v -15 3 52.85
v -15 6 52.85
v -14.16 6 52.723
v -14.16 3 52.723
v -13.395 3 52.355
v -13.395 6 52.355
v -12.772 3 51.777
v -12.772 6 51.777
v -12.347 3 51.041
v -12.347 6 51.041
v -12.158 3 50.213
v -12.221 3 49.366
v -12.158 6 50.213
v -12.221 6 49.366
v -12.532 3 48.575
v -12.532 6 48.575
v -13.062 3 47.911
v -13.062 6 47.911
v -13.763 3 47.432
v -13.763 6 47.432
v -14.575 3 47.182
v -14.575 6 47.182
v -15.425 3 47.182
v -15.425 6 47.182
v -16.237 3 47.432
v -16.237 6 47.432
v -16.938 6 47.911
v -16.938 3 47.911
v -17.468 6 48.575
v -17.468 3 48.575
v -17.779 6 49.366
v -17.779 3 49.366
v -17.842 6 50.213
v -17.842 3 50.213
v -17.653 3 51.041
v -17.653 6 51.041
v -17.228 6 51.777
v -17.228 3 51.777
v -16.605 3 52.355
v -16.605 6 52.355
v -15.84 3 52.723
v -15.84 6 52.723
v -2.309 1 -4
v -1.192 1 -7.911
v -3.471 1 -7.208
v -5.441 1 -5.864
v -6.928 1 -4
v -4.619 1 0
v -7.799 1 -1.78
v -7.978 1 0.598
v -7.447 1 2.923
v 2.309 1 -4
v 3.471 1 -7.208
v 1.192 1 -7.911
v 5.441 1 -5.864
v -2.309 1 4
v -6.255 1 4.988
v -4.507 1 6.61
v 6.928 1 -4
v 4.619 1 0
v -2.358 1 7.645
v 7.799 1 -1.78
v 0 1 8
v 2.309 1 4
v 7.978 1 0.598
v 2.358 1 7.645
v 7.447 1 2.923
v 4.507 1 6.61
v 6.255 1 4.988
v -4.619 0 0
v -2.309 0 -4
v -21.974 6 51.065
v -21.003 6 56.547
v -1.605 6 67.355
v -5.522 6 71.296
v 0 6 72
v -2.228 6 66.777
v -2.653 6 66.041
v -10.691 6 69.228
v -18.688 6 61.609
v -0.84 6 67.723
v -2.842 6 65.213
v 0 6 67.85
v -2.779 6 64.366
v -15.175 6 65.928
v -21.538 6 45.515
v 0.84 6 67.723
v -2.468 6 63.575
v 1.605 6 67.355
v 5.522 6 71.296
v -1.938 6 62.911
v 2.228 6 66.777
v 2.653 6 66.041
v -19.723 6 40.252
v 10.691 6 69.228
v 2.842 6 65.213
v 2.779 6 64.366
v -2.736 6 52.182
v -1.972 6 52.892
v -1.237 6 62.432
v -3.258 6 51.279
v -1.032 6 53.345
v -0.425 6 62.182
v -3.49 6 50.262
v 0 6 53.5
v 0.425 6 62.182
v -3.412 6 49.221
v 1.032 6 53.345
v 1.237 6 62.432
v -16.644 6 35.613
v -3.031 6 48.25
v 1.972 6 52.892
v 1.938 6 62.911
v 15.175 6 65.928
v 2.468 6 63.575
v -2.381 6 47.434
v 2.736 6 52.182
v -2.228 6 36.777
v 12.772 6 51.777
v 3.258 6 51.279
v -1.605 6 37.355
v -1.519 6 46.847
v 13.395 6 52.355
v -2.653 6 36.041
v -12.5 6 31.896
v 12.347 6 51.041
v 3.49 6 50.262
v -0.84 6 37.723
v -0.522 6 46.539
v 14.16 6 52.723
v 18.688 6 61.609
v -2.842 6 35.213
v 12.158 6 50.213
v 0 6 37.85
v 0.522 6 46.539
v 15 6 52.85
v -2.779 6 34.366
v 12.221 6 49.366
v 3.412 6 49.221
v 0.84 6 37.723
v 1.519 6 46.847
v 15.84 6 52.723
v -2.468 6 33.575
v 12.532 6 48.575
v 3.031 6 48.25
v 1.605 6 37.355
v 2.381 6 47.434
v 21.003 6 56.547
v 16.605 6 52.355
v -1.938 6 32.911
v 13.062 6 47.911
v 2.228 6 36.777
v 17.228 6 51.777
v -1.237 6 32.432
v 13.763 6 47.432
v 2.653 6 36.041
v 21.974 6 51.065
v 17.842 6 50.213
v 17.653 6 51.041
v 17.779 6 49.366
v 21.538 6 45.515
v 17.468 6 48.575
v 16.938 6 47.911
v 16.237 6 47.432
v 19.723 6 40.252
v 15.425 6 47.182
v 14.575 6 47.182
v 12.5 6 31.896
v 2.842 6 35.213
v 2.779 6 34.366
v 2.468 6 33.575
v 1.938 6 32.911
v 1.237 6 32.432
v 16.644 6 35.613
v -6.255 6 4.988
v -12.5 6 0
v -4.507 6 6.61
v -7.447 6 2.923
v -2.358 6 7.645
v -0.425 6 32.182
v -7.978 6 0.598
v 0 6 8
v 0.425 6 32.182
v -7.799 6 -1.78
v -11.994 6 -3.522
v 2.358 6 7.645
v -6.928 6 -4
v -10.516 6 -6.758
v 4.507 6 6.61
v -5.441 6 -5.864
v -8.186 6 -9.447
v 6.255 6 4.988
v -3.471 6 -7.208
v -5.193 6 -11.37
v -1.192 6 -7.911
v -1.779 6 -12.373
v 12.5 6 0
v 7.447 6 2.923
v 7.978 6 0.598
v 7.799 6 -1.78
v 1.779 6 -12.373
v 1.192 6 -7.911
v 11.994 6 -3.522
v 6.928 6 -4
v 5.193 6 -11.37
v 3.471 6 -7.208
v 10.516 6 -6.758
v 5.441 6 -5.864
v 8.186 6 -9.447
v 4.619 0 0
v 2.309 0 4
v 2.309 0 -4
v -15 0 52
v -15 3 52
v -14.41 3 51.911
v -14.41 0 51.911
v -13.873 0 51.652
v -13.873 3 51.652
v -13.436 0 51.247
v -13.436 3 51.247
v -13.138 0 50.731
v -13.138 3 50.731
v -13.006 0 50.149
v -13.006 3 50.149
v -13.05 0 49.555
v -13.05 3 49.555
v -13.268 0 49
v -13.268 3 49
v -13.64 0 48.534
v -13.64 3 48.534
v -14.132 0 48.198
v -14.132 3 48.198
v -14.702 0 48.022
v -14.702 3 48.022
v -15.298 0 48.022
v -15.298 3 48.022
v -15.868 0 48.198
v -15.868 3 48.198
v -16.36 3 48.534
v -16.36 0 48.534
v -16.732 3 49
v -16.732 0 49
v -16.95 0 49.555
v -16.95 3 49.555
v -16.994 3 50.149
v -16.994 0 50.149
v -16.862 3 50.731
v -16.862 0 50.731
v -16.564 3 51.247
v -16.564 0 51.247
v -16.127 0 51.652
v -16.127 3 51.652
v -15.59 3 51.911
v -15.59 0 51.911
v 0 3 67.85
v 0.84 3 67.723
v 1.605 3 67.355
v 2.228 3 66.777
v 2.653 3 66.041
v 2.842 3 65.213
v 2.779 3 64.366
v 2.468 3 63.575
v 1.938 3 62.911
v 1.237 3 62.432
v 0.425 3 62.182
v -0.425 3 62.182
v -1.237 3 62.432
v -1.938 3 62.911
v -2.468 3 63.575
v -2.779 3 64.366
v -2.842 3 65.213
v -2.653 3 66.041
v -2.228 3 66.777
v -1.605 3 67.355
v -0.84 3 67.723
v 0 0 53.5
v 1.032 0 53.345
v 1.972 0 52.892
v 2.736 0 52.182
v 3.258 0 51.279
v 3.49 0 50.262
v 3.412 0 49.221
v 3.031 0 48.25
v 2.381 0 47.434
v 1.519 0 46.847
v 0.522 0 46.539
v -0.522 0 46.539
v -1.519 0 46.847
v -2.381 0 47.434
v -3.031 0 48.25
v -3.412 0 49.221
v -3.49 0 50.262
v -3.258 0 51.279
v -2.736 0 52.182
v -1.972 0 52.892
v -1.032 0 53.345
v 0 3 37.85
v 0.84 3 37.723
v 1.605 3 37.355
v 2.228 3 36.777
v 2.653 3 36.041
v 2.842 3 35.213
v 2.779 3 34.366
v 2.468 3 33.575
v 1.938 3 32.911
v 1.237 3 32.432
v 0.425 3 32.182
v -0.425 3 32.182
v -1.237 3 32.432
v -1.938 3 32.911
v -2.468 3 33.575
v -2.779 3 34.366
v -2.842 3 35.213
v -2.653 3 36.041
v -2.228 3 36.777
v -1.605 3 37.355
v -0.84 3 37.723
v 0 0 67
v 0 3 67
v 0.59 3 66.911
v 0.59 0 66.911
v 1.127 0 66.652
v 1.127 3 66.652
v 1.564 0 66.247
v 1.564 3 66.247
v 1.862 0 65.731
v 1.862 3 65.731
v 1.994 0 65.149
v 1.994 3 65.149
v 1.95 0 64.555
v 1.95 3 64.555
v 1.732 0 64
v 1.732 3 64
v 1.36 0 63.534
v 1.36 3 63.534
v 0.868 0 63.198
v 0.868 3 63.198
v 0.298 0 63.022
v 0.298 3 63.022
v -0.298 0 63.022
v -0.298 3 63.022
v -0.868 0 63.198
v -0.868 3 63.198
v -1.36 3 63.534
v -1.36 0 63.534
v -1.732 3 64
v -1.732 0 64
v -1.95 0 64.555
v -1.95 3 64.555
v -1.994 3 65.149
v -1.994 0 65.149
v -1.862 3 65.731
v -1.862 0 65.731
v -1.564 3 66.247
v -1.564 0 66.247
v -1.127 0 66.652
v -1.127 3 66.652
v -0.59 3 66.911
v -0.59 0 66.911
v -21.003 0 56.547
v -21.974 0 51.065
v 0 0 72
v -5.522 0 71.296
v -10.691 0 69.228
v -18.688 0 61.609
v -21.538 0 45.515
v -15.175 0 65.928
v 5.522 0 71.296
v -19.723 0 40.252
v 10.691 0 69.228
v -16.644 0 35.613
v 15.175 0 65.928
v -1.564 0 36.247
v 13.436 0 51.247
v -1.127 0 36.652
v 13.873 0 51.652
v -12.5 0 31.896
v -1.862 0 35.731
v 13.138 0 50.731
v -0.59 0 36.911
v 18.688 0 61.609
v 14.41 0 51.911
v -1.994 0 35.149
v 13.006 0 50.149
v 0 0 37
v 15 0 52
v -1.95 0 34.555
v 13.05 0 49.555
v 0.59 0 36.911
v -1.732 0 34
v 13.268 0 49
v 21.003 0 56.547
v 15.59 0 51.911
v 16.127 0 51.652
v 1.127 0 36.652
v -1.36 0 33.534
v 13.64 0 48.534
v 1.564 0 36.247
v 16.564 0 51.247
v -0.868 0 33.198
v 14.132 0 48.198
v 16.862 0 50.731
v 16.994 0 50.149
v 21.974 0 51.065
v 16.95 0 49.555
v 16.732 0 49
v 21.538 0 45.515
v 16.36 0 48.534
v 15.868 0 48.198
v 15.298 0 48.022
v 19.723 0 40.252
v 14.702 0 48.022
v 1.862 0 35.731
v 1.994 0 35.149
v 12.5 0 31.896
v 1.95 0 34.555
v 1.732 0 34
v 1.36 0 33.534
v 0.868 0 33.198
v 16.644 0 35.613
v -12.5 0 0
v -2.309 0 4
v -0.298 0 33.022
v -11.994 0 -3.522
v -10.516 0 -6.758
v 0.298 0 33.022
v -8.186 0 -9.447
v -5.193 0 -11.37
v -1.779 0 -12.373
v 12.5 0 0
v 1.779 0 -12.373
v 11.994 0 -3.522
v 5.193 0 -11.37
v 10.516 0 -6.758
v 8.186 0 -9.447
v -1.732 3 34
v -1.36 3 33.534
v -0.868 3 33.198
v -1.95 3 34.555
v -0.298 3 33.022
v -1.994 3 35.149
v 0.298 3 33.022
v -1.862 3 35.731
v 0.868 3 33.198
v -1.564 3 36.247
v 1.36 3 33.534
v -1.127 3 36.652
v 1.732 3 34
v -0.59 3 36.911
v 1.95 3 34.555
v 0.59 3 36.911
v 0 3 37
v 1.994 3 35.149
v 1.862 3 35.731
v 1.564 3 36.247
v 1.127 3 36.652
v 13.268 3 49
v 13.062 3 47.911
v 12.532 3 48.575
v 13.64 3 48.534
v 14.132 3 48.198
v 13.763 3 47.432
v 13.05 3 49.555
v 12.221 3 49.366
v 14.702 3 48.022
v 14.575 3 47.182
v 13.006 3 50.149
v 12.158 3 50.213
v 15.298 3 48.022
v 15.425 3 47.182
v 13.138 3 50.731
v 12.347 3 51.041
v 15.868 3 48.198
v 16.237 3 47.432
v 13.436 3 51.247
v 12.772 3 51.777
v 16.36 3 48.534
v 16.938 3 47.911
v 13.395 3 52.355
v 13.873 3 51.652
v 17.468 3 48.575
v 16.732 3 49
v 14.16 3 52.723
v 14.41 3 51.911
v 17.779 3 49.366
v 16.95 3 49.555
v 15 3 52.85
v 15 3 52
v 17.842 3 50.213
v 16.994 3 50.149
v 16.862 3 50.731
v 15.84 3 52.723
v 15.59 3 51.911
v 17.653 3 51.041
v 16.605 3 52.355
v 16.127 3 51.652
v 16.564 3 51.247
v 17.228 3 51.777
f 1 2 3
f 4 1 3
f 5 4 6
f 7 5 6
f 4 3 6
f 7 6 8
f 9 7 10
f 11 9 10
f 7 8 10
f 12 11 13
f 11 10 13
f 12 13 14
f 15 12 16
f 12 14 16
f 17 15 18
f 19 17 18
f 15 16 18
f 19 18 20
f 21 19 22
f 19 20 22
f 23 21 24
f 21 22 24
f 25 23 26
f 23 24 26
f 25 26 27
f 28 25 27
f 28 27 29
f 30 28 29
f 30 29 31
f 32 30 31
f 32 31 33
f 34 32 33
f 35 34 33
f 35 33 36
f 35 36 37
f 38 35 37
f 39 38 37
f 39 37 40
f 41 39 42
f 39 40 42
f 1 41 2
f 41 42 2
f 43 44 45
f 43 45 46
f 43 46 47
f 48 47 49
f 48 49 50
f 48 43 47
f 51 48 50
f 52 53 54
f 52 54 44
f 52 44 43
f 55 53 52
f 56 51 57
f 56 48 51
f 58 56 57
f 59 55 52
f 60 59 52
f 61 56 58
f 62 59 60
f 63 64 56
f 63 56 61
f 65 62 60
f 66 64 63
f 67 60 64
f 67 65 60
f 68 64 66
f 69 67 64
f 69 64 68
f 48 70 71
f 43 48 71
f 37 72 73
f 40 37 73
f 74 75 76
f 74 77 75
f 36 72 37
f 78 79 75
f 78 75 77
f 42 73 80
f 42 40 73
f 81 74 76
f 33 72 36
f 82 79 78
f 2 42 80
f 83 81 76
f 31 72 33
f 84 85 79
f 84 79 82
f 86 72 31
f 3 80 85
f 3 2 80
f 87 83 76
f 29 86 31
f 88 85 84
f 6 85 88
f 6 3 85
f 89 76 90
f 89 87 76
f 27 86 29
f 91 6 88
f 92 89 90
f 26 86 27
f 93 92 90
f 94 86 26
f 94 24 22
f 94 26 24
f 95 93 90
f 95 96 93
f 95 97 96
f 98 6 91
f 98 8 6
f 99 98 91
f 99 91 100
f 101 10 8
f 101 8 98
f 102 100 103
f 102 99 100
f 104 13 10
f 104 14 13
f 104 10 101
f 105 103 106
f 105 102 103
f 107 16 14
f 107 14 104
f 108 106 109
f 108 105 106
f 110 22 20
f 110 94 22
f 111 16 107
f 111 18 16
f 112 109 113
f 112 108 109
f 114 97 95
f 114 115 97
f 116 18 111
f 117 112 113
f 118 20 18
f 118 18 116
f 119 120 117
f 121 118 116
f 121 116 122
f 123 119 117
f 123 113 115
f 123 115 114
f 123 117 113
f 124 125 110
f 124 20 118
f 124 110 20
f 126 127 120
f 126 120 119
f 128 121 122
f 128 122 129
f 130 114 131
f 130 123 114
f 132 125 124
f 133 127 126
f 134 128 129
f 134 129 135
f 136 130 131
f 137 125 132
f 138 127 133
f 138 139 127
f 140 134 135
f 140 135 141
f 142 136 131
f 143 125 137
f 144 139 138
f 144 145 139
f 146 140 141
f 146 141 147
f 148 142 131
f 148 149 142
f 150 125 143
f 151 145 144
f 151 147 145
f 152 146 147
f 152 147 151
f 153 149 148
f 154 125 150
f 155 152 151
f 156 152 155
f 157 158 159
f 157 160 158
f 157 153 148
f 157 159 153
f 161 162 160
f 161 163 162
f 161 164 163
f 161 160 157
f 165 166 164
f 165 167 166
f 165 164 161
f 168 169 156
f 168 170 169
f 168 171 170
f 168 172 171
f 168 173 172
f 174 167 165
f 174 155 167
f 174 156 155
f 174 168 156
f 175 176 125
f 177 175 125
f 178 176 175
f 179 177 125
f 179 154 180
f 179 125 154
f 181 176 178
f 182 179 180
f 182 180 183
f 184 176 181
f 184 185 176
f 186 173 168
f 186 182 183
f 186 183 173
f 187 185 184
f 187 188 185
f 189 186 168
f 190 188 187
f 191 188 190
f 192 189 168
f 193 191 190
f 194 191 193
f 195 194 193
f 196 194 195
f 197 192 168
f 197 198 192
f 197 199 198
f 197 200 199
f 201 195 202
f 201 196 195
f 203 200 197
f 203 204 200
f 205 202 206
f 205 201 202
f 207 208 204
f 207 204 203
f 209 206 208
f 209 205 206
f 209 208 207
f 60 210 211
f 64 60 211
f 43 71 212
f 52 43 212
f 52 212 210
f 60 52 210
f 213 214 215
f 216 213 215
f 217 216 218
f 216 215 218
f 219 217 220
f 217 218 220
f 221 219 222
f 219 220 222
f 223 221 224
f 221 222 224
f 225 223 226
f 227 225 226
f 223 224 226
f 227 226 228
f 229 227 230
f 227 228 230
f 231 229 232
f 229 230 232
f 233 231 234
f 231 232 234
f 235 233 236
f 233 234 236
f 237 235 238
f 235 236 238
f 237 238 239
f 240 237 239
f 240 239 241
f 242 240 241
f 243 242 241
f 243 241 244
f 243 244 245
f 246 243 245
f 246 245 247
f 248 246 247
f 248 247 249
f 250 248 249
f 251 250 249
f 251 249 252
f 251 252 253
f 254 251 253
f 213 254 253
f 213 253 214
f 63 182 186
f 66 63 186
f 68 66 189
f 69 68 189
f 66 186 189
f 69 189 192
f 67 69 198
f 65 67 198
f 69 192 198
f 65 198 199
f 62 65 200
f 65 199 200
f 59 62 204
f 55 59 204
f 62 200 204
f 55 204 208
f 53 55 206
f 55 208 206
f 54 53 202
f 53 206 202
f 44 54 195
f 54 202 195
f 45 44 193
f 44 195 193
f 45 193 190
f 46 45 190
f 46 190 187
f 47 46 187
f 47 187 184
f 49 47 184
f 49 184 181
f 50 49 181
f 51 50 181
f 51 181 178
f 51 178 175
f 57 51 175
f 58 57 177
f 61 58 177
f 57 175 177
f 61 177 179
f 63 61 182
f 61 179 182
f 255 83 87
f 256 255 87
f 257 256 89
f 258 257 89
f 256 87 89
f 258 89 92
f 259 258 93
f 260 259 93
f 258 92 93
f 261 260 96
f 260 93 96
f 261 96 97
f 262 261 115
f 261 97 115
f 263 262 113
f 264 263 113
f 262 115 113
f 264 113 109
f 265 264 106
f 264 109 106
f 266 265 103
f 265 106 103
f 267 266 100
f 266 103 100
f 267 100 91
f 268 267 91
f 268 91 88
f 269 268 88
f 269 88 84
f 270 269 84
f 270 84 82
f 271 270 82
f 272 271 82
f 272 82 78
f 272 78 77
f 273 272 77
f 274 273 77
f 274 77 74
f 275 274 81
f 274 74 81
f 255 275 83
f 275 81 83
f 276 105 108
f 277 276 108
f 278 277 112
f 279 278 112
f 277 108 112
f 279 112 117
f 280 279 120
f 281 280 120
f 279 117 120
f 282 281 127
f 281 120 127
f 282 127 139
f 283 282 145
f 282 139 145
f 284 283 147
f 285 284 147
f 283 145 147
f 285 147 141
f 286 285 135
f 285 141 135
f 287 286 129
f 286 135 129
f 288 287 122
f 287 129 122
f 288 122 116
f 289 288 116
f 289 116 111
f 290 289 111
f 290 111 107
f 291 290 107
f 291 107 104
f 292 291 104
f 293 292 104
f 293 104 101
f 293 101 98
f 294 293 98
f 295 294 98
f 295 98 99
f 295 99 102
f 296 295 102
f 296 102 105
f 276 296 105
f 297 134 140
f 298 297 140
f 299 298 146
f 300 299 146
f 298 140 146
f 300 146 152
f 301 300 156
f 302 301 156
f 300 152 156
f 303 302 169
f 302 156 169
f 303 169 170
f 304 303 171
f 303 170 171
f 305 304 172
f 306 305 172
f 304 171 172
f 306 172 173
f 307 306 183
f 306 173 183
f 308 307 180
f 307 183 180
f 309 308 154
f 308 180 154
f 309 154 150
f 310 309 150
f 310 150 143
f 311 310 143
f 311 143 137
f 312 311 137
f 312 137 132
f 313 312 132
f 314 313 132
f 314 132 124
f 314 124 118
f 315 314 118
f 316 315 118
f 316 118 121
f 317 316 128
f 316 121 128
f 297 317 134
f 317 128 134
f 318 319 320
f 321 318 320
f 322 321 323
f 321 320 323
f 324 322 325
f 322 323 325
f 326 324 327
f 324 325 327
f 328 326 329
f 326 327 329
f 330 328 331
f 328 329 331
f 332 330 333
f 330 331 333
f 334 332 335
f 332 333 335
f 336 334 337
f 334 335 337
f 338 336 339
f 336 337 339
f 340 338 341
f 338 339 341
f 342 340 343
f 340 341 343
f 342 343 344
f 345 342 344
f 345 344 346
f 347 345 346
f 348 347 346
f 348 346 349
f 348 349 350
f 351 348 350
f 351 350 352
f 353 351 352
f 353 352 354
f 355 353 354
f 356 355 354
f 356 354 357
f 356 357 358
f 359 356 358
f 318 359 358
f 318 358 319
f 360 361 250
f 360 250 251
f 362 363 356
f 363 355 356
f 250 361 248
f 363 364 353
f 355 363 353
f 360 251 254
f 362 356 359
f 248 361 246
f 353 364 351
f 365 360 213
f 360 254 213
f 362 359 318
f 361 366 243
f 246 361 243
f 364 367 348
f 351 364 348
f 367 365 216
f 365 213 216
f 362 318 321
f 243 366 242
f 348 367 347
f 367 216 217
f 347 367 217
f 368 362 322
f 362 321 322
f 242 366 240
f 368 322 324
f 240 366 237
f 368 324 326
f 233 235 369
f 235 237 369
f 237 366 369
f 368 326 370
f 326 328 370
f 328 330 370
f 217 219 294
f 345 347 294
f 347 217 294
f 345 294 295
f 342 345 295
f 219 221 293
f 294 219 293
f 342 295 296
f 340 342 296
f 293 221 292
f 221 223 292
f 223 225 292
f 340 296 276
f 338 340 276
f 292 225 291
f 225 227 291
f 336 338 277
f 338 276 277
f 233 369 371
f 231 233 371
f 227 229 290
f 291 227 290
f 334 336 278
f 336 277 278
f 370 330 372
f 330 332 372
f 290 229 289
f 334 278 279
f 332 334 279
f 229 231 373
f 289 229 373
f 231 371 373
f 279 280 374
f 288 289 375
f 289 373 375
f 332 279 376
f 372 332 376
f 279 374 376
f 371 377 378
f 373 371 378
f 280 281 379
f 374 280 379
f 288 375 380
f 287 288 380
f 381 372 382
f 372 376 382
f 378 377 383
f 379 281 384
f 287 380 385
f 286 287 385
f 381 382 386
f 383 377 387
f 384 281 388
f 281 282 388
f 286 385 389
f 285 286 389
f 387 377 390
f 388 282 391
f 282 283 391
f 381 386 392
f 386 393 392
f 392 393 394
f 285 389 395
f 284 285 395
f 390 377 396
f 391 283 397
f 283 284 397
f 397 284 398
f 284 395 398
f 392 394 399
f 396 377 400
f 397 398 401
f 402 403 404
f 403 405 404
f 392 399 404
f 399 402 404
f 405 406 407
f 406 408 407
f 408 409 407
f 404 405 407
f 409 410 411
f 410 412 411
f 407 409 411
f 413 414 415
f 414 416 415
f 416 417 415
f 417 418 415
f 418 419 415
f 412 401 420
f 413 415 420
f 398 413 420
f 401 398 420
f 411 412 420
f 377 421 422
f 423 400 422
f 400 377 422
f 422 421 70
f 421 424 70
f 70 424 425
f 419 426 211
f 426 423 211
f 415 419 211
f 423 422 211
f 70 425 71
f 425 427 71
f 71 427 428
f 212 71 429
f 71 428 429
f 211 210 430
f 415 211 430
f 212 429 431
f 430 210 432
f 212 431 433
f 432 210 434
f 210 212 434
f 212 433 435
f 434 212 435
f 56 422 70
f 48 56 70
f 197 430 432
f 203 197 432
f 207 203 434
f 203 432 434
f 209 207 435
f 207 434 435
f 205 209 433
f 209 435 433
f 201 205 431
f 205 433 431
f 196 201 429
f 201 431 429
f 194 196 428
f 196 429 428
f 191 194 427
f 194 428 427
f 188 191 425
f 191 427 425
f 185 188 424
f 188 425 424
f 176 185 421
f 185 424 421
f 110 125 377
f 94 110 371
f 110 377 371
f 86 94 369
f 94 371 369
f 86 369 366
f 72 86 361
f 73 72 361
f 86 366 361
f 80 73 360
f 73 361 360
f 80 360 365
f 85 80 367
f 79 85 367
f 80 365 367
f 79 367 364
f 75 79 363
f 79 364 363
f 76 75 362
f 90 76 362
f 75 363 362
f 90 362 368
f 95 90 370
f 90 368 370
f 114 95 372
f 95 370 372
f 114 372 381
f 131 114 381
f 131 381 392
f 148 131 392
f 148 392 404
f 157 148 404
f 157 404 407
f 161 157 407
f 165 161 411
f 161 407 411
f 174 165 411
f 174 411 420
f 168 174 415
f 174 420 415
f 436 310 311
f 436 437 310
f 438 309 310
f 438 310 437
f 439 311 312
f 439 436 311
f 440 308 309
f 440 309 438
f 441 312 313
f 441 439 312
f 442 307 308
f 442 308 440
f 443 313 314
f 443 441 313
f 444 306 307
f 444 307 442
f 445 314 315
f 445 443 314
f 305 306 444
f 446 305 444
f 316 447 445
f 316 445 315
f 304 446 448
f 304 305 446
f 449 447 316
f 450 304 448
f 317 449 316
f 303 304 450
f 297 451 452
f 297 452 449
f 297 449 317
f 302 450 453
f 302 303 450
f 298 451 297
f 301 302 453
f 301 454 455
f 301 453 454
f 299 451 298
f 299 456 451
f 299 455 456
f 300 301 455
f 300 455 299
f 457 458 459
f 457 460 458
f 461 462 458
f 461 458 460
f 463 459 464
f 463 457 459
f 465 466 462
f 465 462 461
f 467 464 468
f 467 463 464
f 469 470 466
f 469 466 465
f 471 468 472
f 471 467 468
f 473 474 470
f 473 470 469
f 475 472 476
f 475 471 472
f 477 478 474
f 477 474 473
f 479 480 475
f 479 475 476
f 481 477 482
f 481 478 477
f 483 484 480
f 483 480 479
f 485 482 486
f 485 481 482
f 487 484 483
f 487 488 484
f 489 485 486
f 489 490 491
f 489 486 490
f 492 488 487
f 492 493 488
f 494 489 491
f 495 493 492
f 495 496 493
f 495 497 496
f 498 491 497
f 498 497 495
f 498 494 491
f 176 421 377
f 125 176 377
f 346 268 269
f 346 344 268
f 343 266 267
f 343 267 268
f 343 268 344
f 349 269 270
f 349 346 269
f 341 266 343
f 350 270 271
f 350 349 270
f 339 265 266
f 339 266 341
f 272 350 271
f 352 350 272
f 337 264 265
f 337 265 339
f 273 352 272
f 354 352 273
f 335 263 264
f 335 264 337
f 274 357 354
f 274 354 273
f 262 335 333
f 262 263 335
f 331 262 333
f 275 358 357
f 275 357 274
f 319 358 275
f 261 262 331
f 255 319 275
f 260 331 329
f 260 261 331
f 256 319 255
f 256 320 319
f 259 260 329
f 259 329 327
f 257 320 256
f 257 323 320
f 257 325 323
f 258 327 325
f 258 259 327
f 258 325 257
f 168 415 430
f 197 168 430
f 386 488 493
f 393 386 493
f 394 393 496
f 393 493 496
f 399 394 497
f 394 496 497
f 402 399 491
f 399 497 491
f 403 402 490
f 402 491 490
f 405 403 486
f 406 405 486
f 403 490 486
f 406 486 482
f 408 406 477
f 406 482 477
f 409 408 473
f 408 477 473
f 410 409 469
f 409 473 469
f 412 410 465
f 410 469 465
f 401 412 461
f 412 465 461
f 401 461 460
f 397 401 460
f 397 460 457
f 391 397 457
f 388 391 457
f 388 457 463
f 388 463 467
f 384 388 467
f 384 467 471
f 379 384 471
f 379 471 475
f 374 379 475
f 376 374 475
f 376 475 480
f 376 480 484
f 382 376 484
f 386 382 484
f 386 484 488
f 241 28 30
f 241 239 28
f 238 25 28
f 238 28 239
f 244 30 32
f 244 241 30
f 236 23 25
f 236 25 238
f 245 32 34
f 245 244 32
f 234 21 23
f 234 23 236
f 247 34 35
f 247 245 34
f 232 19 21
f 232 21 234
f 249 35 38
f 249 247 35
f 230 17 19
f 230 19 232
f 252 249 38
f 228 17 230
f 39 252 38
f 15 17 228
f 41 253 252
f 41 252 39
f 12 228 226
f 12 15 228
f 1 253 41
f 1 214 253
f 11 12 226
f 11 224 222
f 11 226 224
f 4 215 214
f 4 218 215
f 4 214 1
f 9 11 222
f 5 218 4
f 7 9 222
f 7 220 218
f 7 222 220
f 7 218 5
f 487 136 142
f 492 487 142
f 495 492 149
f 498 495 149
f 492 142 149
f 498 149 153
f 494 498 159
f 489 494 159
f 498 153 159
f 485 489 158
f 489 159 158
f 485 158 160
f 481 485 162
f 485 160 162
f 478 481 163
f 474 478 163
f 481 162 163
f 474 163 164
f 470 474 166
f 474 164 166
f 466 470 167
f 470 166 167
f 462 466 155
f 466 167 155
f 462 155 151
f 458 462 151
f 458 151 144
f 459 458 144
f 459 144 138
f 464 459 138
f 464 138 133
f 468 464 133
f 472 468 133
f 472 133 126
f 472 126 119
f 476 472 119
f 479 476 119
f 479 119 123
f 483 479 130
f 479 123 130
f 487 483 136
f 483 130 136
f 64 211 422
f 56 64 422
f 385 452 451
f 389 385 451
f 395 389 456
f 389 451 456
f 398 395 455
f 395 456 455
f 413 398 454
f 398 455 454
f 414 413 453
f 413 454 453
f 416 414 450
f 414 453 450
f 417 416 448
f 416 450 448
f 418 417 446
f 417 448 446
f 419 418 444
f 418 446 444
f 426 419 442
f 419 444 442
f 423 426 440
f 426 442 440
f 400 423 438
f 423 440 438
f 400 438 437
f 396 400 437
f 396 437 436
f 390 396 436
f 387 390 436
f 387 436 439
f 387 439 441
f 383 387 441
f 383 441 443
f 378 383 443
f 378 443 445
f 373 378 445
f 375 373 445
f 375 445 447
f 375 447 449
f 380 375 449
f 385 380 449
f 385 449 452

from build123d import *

# Parameters (mm, degrees)
BOSS_EXTRUDE1_DEPTH = 6
SKETCH2_R           = 2.85
CUT_EXTRUDE1_DEPTH  = 3
SKETCH3_R           = 2
SKETCH3_R_2         = 3.5
CUT_EXTRUDE2_DEPTH  = 76.524830354
SKETCH4_R           = 8
CUT_EXTRUDE3_DEPTH  = 5
SKETCH5_R           = 3.5
CUT_EXTRUDE4_DEPTH  = 76.524830354
CUT_EXTRUDE5_DEPTH  = 3


with BuildPart() as part:
    # Sketch1 → Boss-Extrude1 (new body)
    with BuildSketch(Plane(origin=(0, 0, 0), x_dir=(1, 0, 0), z_dir=(0, 1, 0))):
        with BuildLine():
            Line((-12.5, 0), (-12.5, -31.89613301))
            ThreePointArc((-12.5, -31.89613301), (0, -72), (12.5, -31.89613301))
            Line((12.5, -31.89613301), (12.5, 0))
            ThreePointArc((12.5, 0), (0, 12.5), (-12.5, 0))
        make_face()
    extrude(amount=BOSS_EXTRUDE1_DEPTH)

    # Sketch2 → Cut-Extrude1 (cut)
    with BuildSketch(Plane(origin=(0, 6, 0), x_dir=(1, 0, 0), z_dir=(0, 1, 0))):
        with Locations(Location((0, -35, 0), (0, 0, 270))):
            Circle(SKETCH2_R)
        with Locations(Location((15, -50, 0), (0, 0, 270))):
            Circle(SKETCH2_R)
        with Locations(Location((0, -65, 0), (0, 0, 270))):
            Circle(SKETCH2_R)
        with Locations(Location((-15, -50, 0), (0, 0, 270))):
            Circle(SKETCH2_R)
    extrude(amount=-CUT_EXTRUDE1_DEPTH, mode=Mode.SUBTRACT)

    # Sketch3 → Cut-Extrude2 (cut, through all)
    with BuildSketch(Plane(origin=(0, 6, 0), x_dir=(1, 0, 0), z_dir=(0, 1, 0))):
        with Locations(Location((0, -35, 0), (0, 0, 270))):
            Circle(SKETCH3_R)
        with Locations(Location((15, -50, 0), (0, 0, 270))):
            Circle(SKETCH3_R)
        with Locations(Location((0, -65, 0), (0, 0, 270))):
            Circle(SKETCH3_R)
        with Locations(Location((-15, -50, 0), (0, 0, 270))):
            Circle(SKETCH3_R)
        with Locations(Location((0, -50, 0), (0, 0, 270))):
            Circle(SKETCH3_R_2)
    extrude(amount=-CUT_EXTRUDE2_DEPTH, mode=Mode.SUBTRACT)

    # Sketch4 → Cut-Extrude3 (cut)
    with BuildSketch(Plane(origin=(0, 6, 0), x_dir=(1, 0, 0), z_dir=(0, 1, 0))):
        with Locations(Location((0, 0, 0), (0, 0, 270))):
            Circle(SKETCH4_R)
    extrude(amount=-CUT_EXTRUDE3_DEPTH, mode=Mode.SUBTRACT)

    # Sketch5 → Cut-Extrude4 (cut, through all)
    with BuildSketch(Plane(origin=(0, 6, 0), x_dir=(1, 0, 0), z_dir=(0, 1, 0))):
        with Locations(Location((0, 0, 0), (0, 0, 270))):
            Circle(SKETCH5_R)
    extrude(amount=-CUT_EXTRUDE4_DEPTH, mode=Mode.SUBTRACT)

    # Sketch6 → Cut-Extrude5 (cut)
    with BuildSketch(Plane.XZ):
        Polygon((4.618802154, 0), (2.309401077, 4), (-2.309401077, 4), (-4.618802154, 0), (-2.309401077, -4), (2.309401077, -4), align=None)
    extrude(amount=-CUT_EXTRUDE5_DEPTH, mode=Mode.SUBTRACT)


solid = part.part
